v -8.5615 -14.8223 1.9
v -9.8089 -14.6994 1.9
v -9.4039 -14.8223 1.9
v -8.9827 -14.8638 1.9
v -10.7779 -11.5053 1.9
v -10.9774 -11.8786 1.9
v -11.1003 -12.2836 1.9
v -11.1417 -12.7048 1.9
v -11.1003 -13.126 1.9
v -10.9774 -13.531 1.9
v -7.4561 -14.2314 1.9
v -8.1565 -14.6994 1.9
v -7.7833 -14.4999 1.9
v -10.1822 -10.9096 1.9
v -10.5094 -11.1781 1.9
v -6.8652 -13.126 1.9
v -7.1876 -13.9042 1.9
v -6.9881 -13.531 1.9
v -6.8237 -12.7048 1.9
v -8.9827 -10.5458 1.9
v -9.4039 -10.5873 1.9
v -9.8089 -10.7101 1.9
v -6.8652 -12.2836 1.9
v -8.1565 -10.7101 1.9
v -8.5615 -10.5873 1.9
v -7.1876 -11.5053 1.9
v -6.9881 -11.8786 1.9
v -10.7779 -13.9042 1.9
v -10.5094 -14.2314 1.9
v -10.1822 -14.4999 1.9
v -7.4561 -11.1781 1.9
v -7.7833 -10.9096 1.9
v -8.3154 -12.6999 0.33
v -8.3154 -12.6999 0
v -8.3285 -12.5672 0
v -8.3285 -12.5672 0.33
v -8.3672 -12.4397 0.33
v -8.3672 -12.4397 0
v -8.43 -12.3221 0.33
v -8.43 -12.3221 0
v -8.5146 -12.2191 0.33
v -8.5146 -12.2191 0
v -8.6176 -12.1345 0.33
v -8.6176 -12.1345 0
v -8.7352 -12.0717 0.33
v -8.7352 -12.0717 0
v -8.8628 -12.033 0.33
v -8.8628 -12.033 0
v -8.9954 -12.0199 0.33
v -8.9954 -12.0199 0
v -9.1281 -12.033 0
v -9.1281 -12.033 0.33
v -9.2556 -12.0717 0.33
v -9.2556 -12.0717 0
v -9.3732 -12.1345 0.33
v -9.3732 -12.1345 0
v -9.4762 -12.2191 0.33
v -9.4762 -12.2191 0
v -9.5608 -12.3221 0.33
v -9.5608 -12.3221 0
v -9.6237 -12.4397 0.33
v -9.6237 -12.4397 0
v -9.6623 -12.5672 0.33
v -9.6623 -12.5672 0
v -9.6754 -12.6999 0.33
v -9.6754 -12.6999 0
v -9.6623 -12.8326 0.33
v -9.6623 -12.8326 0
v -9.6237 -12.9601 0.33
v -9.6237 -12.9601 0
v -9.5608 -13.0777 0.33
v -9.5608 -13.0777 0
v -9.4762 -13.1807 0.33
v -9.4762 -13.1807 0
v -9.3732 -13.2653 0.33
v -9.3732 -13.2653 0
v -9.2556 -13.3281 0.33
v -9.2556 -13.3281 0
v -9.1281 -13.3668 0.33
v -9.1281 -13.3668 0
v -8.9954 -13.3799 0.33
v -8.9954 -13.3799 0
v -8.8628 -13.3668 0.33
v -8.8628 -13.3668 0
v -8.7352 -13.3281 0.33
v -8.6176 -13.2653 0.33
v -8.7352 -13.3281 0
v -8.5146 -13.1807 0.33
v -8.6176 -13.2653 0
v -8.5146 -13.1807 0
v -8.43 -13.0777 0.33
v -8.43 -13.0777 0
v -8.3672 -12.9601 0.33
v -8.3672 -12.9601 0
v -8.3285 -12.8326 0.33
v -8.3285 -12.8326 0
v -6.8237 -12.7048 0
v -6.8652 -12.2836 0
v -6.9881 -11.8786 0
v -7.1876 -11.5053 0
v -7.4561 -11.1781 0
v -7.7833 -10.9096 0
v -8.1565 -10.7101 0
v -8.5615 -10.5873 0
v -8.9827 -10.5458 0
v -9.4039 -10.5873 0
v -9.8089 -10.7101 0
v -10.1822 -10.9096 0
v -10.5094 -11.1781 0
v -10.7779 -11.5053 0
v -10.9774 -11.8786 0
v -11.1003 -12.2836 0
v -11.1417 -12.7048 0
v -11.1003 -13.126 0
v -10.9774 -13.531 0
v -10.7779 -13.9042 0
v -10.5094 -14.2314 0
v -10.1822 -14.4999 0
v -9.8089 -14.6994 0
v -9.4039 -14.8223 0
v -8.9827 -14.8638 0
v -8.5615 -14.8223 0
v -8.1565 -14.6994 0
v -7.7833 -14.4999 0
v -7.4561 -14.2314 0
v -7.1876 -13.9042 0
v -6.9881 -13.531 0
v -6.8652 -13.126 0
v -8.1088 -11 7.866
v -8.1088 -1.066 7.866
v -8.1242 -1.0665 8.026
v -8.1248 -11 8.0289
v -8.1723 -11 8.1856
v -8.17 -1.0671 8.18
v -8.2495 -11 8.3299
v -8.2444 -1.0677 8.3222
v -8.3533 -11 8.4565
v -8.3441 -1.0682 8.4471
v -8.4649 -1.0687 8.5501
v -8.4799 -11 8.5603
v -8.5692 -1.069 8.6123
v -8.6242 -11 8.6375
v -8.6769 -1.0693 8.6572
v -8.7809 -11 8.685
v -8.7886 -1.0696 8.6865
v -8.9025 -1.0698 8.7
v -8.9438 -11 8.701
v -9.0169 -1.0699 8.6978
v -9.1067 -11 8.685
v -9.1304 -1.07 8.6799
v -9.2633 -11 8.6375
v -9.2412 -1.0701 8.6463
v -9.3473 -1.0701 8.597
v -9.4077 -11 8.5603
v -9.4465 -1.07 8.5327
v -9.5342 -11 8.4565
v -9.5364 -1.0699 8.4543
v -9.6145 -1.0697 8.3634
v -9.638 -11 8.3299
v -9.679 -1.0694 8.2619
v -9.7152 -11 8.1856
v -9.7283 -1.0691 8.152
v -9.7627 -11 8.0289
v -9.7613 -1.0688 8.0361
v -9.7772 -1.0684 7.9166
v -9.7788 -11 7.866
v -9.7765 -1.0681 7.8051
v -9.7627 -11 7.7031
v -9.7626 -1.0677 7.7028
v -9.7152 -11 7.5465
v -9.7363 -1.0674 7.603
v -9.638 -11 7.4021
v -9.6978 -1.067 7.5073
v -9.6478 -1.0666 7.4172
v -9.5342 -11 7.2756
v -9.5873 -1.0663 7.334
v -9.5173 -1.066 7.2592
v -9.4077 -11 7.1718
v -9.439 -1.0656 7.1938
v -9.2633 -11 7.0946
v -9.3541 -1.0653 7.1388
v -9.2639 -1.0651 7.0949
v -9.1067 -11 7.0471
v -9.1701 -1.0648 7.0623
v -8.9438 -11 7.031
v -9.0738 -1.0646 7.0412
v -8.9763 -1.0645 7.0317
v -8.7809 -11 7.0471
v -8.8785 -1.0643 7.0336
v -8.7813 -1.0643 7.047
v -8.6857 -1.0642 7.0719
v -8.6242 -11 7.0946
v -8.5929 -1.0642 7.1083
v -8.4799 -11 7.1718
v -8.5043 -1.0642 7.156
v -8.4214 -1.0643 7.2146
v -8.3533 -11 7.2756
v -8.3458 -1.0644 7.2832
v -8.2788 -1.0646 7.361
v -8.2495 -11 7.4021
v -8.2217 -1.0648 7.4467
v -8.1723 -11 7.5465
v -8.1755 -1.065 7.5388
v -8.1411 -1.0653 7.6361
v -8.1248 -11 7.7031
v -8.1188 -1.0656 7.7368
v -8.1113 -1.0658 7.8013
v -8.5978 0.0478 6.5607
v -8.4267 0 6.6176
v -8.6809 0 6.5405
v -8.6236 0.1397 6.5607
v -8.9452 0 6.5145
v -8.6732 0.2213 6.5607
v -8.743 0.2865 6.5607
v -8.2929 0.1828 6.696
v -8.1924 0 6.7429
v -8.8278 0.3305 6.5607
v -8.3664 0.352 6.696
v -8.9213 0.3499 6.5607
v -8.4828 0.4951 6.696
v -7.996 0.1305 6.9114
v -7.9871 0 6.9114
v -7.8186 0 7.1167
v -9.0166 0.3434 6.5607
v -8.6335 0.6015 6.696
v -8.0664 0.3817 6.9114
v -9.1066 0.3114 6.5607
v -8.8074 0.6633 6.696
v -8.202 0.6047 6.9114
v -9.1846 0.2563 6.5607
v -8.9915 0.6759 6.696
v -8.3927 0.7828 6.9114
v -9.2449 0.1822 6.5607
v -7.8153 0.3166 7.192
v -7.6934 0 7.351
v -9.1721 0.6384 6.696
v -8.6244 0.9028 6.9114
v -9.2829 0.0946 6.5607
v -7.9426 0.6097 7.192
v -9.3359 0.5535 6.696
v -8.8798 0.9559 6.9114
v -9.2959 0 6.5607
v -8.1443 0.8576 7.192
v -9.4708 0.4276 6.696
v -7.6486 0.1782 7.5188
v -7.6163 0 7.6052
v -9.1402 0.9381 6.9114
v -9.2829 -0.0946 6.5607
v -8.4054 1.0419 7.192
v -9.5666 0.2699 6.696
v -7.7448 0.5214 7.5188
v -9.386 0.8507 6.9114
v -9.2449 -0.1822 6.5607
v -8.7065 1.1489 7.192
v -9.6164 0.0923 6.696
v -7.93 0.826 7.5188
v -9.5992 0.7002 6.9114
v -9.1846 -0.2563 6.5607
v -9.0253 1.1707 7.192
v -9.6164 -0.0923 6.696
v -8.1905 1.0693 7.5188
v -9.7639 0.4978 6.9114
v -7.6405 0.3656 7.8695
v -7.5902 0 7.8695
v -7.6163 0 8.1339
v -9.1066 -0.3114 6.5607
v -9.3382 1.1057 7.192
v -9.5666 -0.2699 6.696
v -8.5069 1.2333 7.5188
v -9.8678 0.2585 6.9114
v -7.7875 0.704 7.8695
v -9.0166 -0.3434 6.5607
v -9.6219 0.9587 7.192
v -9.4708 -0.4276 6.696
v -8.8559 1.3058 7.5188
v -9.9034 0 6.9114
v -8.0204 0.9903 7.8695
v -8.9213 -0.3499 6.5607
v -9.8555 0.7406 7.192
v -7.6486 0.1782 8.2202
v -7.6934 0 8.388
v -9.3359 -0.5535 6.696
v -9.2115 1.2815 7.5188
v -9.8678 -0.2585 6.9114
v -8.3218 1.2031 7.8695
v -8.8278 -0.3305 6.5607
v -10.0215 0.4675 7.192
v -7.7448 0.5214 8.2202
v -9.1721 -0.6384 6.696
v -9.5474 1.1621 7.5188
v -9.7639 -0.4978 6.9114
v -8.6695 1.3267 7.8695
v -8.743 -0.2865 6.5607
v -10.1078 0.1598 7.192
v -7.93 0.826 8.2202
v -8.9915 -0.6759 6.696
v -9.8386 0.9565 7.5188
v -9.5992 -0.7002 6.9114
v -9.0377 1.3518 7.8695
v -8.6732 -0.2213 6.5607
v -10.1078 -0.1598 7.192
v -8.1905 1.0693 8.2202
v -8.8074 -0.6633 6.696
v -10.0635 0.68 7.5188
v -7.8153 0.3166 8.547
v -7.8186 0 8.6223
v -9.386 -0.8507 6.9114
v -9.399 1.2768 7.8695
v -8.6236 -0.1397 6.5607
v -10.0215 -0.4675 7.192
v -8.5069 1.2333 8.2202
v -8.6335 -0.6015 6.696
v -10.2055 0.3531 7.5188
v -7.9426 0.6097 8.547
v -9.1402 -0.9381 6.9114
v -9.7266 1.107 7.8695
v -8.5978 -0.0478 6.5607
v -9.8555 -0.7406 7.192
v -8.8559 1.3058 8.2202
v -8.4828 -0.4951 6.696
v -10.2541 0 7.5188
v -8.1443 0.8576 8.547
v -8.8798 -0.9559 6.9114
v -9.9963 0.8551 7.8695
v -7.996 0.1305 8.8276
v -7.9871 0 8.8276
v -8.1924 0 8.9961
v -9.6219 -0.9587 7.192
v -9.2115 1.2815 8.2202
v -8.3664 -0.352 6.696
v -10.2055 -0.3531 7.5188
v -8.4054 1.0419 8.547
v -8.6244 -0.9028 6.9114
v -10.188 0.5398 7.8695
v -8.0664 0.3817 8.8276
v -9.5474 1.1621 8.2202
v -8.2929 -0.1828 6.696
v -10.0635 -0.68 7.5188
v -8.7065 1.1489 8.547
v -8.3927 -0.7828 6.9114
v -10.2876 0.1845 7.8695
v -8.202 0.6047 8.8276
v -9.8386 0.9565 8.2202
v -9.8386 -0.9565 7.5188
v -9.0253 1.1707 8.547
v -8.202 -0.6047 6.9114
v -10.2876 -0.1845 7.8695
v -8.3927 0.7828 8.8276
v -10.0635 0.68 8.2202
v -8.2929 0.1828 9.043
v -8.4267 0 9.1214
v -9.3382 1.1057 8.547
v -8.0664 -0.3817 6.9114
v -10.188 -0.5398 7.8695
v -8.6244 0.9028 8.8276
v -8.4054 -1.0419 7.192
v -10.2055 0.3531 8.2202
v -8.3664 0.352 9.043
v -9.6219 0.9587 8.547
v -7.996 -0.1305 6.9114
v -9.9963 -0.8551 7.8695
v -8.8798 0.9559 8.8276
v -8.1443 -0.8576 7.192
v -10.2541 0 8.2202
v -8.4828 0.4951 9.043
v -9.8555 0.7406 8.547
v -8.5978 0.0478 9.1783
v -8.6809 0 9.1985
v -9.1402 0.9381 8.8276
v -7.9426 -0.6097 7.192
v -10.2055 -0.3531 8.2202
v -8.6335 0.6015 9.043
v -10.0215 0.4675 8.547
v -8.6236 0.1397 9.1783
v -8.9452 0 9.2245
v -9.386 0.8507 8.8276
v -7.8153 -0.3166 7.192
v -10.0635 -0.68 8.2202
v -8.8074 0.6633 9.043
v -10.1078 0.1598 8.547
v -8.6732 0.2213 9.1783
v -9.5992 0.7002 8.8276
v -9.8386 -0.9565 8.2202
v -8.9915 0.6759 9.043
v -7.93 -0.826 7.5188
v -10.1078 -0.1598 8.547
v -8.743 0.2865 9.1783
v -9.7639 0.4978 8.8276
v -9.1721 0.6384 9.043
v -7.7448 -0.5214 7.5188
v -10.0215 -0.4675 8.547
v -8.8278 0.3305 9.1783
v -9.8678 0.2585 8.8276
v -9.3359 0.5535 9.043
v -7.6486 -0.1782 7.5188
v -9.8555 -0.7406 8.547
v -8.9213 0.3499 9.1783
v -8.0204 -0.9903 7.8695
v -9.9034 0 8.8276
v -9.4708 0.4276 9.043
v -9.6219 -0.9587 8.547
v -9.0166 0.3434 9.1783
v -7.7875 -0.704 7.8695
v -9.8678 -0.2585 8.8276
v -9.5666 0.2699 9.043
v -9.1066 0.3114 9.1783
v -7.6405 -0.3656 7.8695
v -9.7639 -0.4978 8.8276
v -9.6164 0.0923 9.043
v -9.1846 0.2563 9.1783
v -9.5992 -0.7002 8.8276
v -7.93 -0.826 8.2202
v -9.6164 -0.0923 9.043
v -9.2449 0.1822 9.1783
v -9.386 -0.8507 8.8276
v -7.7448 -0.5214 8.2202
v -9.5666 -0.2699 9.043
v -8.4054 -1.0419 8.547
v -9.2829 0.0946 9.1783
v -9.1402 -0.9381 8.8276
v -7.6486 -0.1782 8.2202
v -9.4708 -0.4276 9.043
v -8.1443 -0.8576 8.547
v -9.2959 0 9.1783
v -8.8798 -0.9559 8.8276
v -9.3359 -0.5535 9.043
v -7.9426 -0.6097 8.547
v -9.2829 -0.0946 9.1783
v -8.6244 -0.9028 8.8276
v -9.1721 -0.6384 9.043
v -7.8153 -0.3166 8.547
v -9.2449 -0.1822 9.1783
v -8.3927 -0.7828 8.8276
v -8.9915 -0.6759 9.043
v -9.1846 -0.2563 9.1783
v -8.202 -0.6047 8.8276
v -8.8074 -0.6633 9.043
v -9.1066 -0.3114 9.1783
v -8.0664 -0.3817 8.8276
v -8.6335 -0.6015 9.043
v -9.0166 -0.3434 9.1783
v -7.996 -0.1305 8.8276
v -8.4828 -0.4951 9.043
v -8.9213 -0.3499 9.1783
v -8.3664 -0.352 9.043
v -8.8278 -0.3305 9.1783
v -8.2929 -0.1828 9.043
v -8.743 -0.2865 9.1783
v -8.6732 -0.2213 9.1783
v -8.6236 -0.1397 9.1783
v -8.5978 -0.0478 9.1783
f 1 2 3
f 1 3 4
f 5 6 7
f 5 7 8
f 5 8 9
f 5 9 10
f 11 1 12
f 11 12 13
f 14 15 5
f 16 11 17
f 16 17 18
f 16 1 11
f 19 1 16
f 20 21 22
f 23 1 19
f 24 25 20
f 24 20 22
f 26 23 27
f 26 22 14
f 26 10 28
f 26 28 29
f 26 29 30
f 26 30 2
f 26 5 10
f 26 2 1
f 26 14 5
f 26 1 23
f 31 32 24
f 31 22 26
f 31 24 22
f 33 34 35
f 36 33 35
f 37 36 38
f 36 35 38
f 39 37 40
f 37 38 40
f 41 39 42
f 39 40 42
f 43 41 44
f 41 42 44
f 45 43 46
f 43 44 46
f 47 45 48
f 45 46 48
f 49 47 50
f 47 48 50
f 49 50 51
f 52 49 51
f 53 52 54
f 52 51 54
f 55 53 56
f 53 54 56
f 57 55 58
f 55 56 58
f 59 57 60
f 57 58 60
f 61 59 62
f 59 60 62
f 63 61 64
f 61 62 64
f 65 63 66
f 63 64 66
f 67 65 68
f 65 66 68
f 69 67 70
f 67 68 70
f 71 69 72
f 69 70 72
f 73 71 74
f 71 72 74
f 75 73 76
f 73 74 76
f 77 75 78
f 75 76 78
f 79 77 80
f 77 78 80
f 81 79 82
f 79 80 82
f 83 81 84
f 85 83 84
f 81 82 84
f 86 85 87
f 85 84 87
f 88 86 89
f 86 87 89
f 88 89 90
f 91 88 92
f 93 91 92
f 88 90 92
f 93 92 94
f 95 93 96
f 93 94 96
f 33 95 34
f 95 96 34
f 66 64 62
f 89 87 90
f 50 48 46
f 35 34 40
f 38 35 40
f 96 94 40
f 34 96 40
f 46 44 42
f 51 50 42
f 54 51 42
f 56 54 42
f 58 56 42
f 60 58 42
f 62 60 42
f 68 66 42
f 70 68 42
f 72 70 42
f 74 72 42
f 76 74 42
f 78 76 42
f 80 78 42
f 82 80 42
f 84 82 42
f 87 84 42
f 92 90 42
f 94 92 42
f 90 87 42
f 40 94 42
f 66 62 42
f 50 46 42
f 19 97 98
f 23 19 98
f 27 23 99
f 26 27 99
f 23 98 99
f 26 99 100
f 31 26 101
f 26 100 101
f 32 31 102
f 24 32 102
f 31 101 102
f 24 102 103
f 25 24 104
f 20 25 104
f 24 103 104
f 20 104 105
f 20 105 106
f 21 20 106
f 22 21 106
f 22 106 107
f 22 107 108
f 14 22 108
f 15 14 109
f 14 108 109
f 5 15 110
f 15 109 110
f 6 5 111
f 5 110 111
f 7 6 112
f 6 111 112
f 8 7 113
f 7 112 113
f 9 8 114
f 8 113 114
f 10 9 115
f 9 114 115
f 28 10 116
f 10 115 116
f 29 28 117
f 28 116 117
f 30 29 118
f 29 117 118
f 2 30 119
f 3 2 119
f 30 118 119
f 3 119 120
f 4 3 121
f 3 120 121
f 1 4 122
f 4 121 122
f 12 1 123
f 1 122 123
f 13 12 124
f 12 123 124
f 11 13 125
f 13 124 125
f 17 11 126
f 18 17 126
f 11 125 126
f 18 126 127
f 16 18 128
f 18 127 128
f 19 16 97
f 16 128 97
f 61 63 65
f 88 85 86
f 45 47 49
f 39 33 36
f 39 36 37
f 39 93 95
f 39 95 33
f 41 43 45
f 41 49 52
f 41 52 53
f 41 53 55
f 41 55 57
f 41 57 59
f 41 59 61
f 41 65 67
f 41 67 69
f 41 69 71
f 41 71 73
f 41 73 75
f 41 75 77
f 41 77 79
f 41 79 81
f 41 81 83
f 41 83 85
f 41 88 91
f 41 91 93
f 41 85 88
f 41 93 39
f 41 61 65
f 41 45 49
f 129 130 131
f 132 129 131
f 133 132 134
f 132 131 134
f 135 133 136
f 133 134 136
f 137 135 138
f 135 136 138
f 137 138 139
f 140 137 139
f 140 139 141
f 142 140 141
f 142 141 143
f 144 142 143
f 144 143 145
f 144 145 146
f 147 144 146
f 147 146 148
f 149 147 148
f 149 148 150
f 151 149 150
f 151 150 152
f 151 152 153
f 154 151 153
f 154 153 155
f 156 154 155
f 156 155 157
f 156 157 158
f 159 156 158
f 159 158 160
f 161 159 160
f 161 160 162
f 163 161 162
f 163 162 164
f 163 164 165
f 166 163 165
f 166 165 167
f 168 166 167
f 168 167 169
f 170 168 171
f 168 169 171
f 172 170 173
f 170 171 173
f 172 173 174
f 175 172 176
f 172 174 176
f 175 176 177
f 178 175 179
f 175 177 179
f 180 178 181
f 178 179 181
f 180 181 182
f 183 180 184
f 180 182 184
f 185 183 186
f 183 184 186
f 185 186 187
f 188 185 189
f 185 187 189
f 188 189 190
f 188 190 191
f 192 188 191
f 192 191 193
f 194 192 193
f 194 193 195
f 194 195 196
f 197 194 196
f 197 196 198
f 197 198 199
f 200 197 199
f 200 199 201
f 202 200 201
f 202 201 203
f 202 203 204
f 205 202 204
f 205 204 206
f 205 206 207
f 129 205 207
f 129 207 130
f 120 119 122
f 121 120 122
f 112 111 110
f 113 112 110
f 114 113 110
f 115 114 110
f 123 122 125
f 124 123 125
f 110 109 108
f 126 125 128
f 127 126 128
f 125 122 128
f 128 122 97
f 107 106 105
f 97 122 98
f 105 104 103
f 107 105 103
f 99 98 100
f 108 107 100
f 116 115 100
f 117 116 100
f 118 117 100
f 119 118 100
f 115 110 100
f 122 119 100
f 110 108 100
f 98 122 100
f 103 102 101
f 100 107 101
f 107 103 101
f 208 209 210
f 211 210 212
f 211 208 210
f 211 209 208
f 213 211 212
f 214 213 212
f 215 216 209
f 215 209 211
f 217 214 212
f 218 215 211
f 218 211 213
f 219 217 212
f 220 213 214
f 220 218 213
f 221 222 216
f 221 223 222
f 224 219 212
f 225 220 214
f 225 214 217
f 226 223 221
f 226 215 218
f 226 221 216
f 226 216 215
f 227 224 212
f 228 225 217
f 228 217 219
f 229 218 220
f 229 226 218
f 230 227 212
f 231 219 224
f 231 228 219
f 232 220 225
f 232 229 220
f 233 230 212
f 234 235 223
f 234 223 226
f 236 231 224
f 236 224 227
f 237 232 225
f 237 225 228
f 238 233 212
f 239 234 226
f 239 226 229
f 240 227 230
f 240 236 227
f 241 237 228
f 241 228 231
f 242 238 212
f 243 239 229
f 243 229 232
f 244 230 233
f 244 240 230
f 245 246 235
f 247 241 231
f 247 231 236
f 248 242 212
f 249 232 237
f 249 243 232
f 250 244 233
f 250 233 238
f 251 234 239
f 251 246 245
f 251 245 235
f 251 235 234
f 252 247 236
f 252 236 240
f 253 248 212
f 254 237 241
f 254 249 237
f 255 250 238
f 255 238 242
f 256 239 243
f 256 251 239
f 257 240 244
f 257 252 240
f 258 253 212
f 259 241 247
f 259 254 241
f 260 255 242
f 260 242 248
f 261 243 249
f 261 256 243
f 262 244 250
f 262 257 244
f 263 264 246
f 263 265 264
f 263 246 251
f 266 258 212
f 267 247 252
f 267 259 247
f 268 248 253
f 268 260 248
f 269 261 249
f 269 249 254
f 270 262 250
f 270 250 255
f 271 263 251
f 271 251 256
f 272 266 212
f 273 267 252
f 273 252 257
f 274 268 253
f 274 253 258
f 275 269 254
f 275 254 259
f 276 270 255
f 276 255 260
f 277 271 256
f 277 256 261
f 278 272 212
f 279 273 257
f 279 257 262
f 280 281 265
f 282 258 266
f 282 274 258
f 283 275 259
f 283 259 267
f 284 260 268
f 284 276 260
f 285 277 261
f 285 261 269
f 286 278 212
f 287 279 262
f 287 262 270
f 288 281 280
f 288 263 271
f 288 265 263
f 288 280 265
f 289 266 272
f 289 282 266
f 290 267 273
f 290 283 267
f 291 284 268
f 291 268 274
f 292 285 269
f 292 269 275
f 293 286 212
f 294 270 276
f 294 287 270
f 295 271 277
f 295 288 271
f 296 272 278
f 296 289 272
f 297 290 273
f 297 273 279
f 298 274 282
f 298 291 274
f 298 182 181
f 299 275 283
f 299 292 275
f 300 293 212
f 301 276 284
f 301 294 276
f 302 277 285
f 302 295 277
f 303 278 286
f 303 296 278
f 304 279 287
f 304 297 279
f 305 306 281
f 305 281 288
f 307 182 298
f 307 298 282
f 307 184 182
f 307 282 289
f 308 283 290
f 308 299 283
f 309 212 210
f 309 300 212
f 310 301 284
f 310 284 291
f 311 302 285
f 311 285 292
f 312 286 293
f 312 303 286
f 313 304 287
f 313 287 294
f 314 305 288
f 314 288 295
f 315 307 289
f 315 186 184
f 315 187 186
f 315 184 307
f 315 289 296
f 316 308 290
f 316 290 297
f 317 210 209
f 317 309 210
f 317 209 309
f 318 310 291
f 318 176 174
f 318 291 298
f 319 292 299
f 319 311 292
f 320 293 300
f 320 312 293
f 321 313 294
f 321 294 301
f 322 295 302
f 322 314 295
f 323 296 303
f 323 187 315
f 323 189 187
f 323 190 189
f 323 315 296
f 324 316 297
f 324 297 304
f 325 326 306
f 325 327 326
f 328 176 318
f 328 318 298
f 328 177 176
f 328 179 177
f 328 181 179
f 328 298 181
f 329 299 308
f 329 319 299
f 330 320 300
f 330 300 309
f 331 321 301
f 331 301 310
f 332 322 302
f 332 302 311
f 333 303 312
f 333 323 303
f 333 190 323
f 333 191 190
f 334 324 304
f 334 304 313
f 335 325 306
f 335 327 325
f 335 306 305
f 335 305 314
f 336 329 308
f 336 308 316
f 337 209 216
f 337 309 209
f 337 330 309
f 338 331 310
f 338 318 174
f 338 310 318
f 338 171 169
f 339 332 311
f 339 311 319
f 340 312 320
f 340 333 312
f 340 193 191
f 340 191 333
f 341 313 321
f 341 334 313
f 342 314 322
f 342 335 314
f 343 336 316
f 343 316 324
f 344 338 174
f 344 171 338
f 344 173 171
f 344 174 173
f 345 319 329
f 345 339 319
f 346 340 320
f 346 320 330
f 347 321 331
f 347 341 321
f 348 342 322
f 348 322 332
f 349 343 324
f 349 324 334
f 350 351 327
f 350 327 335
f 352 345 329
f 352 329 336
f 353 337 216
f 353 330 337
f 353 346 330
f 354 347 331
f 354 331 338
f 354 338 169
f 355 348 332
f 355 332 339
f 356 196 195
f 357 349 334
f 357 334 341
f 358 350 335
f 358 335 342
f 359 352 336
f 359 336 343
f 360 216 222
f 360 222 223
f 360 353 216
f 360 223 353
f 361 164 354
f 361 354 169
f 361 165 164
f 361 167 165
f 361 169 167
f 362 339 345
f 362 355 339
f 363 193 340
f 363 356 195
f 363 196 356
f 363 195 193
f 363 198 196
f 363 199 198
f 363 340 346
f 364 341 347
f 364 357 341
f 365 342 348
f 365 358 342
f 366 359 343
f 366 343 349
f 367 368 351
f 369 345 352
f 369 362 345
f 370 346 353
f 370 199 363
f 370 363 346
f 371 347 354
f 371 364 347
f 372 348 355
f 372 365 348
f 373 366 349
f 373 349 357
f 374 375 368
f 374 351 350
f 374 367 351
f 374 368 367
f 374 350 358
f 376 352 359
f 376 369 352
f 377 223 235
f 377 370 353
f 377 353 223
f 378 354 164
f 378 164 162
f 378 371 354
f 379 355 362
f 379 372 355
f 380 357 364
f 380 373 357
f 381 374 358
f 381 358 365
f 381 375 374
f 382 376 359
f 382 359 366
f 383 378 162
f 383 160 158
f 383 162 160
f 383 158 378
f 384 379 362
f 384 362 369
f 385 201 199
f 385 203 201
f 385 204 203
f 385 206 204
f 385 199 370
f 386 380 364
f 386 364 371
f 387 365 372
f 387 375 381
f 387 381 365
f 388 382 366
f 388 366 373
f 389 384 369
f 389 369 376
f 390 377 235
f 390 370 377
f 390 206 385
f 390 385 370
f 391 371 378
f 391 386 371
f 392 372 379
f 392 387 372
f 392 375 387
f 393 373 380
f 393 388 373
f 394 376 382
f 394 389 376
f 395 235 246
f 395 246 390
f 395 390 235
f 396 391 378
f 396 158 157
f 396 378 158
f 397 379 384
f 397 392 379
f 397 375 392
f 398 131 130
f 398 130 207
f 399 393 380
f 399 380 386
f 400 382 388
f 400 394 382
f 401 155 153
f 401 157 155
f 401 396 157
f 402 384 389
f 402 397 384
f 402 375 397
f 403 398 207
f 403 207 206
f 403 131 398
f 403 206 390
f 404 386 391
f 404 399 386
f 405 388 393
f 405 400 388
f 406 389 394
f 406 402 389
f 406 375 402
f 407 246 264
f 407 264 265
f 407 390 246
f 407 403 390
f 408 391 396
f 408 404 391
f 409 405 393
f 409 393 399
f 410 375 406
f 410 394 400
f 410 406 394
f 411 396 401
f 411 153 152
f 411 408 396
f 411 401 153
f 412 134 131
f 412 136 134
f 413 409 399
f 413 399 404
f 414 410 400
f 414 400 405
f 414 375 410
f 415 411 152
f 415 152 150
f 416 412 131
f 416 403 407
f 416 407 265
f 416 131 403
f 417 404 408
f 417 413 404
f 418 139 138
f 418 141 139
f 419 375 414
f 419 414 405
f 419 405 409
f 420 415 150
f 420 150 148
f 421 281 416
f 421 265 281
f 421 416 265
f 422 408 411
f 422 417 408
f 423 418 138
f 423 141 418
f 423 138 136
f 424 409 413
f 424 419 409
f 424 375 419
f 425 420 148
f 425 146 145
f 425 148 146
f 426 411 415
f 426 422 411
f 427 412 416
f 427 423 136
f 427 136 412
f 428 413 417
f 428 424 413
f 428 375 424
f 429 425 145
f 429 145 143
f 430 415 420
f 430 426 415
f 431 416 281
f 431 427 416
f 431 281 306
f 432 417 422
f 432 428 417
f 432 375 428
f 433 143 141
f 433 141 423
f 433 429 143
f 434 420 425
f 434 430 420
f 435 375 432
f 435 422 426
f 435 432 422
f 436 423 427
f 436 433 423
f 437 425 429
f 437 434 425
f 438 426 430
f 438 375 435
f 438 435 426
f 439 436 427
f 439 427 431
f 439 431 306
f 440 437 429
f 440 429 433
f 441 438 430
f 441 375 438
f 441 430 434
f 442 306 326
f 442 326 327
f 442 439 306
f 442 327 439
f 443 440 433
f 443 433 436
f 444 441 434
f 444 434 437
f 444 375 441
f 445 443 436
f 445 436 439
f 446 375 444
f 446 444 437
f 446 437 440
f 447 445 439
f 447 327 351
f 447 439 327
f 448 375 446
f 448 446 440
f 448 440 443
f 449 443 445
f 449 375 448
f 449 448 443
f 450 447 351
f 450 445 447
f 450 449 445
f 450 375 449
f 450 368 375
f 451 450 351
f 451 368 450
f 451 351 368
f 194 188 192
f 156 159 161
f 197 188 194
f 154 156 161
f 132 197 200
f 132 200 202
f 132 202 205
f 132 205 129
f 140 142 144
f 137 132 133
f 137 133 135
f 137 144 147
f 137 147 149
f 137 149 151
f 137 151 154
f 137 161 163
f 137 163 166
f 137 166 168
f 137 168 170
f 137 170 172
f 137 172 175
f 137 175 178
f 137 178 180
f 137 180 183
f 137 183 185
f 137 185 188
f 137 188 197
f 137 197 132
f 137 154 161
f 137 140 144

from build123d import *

# Parameters (mm, degrees)
F0_R     = 0.835
F1_DEPTH = 11
F4_R     = 2.159
F5_DEPTH = 1.9
F6_R     = 0.68
F7_DEPTH = 0.33


with BuildPart() as f1:
    # F0 (on Front) → F1 (new body)
    with BuildSketch(Plane.XZ):
        with Locations((-8.943764, 7.866043)):
            Circle(F0_R)
    extrude(amount=F1_DEPTH)

    # F2 (on Front) → F3 (revolve)
    with BuildSketch(Plane.XZ):
        with BuildLine():
            Line((-8.945227, 9.224505), (-8.945227, 6.514505))
            ThreePointArc((-8.945227, 6.514505), (-7.590227, 7.869505), (-8.945227, 9.224505))
        make_face()
    revolve(axis=Axis((-8.945227, 0, 7.869505), (0, 0, 1)))


with BuildPart() as f5:
    # F4 (on Top) → F5 (new body)
    with BuildSketch(Plane.XY):
        with Locations((-8.982735, -12.704769)):
            Circle(F4_R)
    extrude(amount=F5_DEPTH)


with BuildPart() as f7:
    # F6 (on Top) → F7 (new body)
    with BuildSketch(Plane.XY):
        with Locations((-8.995413, -12.699911)):
            Circle(F6_R)
    extrude(amount=F7_DEPTH)


solid = Compound([f1.part, f5.part, f7.part])
